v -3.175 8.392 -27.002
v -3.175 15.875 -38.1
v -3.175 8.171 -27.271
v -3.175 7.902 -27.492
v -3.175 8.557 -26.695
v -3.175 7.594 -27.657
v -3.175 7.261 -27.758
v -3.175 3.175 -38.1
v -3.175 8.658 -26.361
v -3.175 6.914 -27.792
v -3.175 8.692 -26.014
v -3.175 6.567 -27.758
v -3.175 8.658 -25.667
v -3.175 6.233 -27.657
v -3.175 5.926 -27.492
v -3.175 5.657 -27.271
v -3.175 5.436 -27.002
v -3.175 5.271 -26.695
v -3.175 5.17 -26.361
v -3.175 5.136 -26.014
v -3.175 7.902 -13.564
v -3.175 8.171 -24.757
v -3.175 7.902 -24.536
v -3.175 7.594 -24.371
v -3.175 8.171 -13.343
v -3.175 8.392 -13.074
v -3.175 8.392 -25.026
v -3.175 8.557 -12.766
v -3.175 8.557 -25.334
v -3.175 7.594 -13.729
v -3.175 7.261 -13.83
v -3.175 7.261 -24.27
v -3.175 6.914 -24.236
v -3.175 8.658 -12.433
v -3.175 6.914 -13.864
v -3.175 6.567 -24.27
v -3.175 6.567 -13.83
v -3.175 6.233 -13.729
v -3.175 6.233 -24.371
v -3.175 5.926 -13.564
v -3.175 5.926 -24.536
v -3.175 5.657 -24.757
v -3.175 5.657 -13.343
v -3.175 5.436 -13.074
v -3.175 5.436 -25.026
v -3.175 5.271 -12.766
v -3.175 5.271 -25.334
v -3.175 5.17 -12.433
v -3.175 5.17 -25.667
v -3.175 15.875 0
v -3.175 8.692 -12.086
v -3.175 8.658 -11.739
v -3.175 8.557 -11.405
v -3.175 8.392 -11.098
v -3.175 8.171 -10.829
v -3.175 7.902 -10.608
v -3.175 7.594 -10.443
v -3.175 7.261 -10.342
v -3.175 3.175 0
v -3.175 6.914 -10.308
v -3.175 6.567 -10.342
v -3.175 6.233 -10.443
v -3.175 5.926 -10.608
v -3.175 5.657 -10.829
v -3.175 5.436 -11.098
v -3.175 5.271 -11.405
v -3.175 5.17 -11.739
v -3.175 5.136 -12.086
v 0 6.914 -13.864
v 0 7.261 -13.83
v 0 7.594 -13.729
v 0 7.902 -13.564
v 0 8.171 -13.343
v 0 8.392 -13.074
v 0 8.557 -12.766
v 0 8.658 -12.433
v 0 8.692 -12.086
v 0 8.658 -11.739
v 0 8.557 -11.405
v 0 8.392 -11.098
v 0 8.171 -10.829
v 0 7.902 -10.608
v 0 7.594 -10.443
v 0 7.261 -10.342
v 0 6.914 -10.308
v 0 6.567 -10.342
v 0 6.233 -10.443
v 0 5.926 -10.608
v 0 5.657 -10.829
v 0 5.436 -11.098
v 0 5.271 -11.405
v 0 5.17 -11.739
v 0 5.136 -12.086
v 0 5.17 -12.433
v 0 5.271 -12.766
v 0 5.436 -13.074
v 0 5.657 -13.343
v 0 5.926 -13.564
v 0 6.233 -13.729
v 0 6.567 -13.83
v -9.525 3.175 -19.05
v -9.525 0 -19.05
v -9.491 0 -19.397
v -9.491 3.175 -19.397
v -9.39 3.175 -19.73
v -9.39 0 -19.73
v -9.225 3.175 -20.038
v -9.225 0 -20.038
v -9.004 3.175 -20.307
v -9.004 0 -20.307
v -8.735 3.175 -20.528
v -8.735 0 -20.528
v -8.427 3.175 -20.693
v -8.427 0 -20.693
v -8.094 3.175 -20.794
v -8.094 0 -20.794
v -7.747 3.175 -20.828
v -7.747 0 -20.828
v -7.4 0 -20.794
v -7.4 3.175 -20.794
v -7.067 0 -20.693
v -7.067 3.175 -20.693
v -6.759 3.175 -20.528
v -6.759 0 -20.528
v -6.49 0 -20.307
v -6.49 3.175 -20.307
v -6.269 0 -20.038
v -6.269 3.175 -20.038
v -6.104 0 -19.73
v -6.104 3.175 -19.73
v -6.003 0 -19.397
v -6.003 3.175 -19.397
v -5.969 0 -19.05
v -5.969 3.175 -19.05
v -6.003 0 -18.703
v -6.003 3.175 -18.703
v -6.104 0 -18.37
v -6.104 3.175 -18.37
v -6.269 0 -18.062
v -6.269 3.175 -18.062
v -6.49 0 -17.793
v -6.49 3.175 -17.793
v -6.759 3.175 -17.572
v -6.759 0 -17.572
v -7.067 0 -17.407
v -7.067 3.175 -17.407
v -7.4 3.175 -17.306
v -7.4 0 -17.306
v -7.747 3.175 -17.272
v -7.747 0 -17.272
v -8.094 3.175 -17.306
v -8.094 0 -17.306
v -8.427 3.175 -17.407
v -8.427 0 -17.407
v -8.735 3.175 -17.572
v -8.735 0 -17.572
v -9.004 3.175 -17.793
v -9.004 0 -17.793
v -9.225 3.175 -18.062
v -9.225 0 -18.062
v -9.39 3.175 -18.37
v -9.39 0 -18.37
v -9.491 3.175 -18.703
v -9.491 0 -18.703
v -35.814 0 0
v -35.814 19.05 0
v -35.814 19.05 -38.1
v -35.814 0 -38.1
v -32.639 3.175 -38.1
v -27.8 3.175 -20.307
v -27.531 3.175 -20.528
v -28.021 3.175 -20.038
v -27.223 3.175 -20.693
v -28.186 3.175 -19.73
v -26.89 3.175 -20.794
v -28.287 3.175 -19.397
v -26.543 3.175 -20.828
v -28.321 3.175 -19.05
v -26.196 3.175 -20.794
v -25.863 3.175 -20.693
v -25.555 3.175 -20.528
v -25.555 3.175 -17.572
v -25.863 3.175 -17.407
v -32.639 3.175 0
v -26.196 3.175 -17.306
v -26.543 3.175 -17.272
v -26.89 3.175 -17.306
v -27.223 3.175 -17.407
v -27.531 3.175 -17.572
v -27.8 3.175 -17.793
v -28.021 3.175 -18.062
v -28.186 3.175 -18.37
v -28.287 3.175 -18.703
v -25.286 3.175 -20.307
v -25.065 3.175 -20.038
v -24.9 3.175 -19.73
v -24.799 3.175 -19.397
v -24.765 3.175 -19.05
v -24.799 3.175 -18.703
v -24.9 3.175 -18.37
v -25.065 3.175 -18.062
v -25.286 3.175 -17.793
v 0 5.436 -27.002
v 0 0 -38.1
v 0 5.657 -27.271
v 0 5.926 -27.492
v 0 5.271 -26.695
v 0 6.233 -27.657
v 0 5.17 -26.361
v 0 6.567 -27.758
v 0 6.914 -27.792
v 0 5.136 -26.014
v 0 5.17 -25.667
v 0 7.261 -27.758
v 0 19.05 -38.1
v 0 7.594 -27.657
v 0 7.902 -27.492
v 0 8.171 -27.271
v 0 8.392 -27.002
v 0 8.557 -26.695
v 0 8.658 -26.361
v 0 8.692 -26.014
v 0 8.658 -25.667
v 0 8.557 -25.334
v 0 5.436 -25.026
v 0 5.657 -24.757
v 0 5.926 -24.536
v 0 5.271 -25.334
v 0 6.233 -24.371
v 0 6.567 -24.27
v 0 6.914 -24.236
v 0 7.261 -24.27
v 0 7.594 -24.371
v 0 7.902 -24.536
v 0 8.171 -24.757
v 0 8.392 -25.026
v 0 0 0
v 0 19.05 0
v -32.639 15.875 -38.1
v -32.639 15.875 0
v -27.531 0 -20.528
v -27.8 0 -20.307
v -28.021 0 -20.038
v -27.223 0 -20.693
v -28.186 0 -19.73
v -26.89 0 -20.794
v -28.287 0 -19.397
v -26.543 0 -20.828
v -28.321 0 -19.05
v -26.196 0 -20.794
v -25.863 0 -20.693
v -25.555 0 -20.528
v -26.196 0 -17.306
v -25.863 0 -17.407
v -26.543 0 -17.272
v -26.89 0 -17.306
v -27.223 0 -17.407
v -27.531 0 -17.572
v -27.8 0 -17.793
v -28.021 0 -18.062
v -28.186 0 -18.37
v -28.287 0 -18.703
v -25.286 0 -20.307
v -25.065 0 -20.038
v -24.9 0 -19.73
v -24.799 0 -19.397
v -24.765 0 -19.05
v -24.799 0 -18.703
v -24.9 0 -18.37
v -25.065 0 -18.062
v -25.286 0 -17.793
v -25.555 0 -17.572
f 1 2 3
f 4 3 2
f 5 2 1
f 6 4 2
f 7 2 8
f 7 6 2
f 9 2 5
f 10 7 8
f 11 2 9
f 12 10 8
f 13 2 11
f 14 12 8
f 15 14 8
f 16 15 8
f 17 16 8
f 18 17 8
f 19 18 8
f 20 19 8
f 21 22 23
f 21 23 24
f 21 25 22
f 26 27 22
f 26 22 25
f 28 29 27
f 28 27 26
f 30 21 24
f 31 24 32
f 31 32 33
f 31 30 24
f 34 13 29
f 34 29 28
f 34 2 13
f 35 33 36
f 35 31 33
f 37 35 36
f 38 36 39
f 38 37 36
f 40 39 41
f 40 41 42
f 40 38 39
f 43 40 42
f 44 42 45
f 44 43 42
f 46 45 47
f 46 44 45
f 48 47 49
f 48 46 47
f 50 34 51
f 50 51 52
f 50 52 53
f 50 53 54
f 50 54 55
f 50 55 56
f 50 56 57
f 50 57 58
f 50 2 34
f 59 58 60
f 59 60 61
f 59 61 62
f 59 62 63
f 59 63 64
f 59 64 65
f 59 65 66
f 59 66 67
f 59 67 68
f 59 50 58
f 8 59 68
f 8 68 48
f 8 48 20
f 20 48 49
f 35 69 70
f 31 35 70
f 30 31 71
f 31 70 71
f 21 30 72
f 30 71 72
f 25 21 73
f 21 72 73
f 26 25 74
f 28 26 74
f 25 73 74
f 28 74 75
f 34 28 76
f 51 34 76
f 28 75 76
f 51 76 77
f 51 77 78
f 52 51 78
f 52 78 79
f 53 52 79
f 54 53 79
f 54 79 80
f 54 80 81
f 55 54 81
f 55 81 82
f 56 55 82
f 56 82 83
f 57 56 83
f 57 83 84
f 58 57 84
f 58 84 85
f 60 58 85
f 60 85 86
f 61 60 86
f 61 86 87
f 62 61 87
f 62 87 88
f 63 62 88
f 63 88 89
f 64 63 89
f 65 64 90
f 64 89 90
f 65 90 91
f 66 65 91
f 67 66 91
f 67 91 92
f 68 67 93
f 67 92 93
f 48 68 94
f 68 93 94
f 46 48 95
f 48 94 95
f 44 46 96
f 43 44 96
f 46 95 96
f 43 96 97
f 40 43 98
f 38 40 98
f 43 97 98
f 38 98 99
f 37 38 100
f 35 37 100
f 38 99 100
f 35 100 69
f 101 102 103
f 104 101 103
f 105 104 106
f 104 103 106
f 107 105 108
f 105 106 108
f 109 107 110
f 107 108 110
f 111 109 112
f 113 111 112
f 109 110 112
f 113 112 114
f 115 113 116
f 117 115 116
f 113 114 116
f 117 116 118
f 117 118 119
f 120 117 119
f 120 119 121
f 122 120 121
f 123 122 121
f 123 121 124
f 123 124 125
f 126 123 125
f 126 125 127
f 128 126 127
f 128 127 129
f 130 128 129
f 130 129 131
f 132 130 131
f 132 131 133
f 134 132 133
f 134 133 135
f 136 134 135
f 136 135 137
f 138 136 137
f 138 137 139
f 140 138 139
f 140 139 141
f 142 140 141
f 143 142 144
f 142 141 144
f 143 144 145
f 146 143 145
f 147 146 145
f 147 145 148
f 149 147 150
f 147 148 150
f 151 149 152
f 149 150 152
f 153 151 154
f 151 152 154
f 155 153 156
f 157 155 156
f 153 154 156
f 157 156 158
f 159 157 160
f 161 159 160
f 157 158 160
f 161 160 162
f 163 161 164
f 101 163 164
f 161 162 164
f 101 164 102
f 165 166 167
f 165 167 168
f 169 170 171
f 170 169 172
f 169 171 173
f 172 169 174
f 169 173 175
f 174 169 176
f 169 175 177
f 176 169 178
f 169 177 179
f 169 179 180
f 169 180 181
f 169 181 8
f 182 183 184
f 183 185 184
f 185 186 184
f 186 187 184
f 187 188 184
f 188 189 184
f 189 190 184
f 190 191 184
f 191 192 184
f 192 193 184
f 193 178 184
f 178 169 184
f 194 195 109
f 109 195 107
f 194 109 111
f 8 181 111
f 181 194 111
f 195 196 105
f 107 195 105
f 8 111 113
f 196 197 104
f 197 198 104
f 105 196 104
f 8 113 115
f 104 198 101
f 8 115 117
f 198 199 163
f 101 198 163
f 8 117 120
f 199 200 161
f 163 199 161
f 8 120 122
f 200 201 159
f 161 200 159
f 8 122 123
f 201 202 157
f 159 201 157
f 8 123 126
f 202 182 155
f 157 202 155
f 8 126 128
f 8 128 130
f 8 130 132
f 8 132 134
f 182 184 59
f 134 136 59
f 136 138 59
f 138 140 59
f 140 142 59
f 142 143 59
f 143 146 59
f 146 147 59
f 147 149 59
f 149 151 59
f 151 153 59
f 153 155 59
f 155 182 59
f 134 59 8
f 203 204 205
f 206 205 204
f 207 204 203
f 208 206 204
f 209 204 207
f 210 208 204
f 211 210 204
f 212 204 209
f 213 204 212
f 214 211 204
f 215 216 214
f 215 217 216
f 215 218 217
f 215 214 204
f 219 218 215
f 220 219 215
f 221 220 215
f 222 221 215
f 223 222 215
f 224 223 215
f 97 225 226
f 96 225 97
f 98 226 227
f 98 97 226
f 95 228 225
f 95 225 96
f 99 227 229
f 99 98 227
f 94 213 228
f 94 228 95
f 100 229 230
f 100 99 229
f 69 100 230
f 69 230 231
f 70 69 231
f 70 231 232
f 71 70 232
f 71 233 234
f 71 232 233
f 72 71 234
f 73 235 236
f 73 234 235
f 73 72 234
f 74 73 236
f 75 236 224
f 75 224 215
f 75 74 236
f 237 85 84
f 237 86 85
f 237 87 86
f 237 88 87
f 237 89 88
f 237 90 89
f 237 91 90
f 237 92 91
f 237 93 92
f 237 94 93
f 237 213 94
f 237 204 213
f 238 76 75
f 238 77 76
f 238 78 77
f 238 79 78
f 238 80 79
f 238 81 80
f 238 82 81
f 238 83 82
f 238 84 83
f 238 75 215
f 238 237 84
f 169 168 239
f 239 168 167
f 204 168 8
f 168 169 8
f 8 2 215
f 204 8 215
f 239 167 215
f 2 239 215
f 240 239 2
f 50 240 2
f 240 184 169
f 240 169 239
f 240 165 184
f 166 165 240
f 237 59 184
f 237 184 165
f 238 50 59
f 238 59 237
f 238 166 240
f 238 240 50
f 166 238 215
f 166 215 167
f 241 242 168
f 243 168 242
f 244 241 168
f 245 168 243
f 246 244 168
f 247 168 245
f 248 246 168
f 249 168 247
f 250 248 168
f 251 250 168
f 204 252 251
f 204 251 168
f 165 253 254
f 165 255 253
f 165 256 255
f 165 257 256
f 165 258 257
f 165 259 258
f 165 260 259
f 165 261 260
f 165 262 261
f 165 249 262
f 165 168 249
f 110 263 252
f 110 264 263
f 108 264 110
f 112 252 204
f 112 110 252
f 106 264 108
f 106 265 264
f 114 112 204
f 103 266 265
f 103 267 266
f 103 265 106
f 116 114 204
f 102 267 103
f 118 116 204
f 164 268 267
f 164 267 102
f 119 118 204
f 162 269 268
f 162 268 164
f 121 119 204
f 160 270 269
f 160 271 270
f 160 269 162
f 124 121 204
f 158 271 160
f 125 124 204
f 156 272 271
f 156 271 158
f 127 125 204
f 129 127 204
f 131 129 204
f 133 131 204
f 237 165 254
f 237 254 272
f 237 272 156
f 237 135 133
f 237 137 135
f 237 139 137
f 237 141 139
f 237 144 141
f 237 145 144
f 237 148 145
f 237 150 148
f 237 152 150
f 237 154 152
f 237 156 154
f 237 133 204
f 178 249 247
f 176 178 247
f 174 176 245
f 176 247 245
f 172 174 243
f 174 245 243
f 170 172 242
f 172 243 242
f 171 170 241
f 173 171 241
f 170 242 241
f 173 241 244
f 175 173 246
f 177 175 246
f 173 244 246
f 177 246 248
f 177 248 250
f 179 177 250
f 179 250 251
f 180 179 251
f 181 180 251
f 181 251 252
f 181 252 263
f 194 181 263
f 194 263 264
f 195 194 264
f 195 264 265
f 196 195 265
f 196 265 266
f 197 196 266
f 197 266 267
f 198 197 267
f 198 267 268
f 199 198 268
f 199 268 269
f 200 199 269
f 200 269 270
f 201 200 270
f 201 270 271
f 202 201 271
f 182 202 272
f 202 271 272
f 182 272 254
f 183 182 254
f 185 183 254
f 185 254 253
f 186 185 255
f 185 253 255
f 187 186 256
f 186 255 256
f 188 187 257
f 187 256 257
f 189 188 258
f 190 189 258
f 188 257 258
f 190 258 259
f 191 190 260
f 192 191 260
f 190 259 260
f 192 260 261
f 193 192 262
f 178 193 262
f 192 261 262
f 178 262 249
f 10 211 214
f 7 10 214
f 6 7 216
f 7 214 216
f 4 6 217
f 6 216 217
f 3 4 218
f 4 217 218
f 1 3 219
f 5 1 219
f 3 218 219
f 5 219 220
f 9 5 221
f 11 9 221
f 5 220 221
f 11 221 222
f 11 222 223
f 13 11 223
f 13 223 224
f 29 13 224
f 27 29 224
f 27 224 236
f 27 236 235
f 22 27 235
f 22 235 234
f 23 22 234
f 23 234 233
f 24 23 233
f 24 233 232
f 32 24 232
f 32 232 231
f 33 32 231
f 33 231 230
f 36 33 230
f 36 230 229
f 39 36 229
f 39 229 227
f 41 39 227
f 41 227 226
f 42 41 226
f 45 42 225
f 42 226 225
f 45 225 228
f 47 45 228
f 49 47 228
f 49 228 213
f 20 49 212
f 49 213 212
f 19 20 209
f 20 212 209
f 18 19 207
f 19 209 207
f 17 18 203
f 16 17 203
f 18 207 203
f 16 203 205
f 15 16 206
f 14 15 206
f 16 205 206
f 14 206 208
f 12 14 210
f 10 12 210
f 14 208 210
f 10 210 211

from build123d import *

# Parameters (mm, degrees)
BOSS_EXTRUDE1_DEPTH = 38.1
SKETCH2_R           = 1.778
CUT_EXTRUDE1_DEPTH  = 15.24
SKETCH4_W           = 18.034
SKETCH4_H           = 3.175
BOSS_EXTRUDE2_DEPTH = 38.1
SKETCH3_R           = 1.778
CUT_EXTRUDE2_DEPTH  = 15.24


with BuildPart() as part:
    # Sketch1 → Boss-Extrude1 (new body)
    with BuildSketch(Plane.XY):
        Polygon((0, 0), (0, 19.05), (-35.814, 19.05), (-35.814, 0), (-21.209, 0), (-21.209, 3.175), (-32.639, 3.175), (-32.639, 15.875), (-3.175, 15.875), (-3.175, 0), align=None)
    extrude(amount=-BOSS_EXTRUDE1_DEPTH)

    # Sketch2 → Cut-Extrude1 (cut)
    with BuildSketch(Plane(origin=(0, 0, 0), x_dir=(0, 0, -1), z_dir=(1, 0, 0))):
        with Locations((12.0859042, 6.91388)):
            Circle(SKETCH2_R)
        with Locations((26.0140958, 6.91388)):
            Circle(SKETCH2_R)
    extrude(amount=-CUT_EXTRUDE1_DEPTH, mode=Mode.SUBTRACT)

    # Sketch4 → Boss-Extrude2 (add)
    with BuildSketch(Plane.XY):
        with Locations((-12.192, 1.5875)):
            Rectangle(SKETCH4_W, SKETCH4_H)
    extrude(amount=-BOSS_EXTRUDE2_DEPTH)

    # Sketch3 → Cut-Extrude2 (cut)
    with BuildSketch(Plane(origin=(0, 0, 0), x_dir=(-1, 0, 0), z_dir=(0, -1, 0))):
        with Locations((26.543, 19.05)):
            Circle(SKETCH3_R)
        with Locations((7.747, 19.05)):
            Circle(SKETCH3_R)
    extrude(amount=-CUT_EXTRUDE2_DEPTH, mode=Mode.SUBTRACT)


solid = part.part
